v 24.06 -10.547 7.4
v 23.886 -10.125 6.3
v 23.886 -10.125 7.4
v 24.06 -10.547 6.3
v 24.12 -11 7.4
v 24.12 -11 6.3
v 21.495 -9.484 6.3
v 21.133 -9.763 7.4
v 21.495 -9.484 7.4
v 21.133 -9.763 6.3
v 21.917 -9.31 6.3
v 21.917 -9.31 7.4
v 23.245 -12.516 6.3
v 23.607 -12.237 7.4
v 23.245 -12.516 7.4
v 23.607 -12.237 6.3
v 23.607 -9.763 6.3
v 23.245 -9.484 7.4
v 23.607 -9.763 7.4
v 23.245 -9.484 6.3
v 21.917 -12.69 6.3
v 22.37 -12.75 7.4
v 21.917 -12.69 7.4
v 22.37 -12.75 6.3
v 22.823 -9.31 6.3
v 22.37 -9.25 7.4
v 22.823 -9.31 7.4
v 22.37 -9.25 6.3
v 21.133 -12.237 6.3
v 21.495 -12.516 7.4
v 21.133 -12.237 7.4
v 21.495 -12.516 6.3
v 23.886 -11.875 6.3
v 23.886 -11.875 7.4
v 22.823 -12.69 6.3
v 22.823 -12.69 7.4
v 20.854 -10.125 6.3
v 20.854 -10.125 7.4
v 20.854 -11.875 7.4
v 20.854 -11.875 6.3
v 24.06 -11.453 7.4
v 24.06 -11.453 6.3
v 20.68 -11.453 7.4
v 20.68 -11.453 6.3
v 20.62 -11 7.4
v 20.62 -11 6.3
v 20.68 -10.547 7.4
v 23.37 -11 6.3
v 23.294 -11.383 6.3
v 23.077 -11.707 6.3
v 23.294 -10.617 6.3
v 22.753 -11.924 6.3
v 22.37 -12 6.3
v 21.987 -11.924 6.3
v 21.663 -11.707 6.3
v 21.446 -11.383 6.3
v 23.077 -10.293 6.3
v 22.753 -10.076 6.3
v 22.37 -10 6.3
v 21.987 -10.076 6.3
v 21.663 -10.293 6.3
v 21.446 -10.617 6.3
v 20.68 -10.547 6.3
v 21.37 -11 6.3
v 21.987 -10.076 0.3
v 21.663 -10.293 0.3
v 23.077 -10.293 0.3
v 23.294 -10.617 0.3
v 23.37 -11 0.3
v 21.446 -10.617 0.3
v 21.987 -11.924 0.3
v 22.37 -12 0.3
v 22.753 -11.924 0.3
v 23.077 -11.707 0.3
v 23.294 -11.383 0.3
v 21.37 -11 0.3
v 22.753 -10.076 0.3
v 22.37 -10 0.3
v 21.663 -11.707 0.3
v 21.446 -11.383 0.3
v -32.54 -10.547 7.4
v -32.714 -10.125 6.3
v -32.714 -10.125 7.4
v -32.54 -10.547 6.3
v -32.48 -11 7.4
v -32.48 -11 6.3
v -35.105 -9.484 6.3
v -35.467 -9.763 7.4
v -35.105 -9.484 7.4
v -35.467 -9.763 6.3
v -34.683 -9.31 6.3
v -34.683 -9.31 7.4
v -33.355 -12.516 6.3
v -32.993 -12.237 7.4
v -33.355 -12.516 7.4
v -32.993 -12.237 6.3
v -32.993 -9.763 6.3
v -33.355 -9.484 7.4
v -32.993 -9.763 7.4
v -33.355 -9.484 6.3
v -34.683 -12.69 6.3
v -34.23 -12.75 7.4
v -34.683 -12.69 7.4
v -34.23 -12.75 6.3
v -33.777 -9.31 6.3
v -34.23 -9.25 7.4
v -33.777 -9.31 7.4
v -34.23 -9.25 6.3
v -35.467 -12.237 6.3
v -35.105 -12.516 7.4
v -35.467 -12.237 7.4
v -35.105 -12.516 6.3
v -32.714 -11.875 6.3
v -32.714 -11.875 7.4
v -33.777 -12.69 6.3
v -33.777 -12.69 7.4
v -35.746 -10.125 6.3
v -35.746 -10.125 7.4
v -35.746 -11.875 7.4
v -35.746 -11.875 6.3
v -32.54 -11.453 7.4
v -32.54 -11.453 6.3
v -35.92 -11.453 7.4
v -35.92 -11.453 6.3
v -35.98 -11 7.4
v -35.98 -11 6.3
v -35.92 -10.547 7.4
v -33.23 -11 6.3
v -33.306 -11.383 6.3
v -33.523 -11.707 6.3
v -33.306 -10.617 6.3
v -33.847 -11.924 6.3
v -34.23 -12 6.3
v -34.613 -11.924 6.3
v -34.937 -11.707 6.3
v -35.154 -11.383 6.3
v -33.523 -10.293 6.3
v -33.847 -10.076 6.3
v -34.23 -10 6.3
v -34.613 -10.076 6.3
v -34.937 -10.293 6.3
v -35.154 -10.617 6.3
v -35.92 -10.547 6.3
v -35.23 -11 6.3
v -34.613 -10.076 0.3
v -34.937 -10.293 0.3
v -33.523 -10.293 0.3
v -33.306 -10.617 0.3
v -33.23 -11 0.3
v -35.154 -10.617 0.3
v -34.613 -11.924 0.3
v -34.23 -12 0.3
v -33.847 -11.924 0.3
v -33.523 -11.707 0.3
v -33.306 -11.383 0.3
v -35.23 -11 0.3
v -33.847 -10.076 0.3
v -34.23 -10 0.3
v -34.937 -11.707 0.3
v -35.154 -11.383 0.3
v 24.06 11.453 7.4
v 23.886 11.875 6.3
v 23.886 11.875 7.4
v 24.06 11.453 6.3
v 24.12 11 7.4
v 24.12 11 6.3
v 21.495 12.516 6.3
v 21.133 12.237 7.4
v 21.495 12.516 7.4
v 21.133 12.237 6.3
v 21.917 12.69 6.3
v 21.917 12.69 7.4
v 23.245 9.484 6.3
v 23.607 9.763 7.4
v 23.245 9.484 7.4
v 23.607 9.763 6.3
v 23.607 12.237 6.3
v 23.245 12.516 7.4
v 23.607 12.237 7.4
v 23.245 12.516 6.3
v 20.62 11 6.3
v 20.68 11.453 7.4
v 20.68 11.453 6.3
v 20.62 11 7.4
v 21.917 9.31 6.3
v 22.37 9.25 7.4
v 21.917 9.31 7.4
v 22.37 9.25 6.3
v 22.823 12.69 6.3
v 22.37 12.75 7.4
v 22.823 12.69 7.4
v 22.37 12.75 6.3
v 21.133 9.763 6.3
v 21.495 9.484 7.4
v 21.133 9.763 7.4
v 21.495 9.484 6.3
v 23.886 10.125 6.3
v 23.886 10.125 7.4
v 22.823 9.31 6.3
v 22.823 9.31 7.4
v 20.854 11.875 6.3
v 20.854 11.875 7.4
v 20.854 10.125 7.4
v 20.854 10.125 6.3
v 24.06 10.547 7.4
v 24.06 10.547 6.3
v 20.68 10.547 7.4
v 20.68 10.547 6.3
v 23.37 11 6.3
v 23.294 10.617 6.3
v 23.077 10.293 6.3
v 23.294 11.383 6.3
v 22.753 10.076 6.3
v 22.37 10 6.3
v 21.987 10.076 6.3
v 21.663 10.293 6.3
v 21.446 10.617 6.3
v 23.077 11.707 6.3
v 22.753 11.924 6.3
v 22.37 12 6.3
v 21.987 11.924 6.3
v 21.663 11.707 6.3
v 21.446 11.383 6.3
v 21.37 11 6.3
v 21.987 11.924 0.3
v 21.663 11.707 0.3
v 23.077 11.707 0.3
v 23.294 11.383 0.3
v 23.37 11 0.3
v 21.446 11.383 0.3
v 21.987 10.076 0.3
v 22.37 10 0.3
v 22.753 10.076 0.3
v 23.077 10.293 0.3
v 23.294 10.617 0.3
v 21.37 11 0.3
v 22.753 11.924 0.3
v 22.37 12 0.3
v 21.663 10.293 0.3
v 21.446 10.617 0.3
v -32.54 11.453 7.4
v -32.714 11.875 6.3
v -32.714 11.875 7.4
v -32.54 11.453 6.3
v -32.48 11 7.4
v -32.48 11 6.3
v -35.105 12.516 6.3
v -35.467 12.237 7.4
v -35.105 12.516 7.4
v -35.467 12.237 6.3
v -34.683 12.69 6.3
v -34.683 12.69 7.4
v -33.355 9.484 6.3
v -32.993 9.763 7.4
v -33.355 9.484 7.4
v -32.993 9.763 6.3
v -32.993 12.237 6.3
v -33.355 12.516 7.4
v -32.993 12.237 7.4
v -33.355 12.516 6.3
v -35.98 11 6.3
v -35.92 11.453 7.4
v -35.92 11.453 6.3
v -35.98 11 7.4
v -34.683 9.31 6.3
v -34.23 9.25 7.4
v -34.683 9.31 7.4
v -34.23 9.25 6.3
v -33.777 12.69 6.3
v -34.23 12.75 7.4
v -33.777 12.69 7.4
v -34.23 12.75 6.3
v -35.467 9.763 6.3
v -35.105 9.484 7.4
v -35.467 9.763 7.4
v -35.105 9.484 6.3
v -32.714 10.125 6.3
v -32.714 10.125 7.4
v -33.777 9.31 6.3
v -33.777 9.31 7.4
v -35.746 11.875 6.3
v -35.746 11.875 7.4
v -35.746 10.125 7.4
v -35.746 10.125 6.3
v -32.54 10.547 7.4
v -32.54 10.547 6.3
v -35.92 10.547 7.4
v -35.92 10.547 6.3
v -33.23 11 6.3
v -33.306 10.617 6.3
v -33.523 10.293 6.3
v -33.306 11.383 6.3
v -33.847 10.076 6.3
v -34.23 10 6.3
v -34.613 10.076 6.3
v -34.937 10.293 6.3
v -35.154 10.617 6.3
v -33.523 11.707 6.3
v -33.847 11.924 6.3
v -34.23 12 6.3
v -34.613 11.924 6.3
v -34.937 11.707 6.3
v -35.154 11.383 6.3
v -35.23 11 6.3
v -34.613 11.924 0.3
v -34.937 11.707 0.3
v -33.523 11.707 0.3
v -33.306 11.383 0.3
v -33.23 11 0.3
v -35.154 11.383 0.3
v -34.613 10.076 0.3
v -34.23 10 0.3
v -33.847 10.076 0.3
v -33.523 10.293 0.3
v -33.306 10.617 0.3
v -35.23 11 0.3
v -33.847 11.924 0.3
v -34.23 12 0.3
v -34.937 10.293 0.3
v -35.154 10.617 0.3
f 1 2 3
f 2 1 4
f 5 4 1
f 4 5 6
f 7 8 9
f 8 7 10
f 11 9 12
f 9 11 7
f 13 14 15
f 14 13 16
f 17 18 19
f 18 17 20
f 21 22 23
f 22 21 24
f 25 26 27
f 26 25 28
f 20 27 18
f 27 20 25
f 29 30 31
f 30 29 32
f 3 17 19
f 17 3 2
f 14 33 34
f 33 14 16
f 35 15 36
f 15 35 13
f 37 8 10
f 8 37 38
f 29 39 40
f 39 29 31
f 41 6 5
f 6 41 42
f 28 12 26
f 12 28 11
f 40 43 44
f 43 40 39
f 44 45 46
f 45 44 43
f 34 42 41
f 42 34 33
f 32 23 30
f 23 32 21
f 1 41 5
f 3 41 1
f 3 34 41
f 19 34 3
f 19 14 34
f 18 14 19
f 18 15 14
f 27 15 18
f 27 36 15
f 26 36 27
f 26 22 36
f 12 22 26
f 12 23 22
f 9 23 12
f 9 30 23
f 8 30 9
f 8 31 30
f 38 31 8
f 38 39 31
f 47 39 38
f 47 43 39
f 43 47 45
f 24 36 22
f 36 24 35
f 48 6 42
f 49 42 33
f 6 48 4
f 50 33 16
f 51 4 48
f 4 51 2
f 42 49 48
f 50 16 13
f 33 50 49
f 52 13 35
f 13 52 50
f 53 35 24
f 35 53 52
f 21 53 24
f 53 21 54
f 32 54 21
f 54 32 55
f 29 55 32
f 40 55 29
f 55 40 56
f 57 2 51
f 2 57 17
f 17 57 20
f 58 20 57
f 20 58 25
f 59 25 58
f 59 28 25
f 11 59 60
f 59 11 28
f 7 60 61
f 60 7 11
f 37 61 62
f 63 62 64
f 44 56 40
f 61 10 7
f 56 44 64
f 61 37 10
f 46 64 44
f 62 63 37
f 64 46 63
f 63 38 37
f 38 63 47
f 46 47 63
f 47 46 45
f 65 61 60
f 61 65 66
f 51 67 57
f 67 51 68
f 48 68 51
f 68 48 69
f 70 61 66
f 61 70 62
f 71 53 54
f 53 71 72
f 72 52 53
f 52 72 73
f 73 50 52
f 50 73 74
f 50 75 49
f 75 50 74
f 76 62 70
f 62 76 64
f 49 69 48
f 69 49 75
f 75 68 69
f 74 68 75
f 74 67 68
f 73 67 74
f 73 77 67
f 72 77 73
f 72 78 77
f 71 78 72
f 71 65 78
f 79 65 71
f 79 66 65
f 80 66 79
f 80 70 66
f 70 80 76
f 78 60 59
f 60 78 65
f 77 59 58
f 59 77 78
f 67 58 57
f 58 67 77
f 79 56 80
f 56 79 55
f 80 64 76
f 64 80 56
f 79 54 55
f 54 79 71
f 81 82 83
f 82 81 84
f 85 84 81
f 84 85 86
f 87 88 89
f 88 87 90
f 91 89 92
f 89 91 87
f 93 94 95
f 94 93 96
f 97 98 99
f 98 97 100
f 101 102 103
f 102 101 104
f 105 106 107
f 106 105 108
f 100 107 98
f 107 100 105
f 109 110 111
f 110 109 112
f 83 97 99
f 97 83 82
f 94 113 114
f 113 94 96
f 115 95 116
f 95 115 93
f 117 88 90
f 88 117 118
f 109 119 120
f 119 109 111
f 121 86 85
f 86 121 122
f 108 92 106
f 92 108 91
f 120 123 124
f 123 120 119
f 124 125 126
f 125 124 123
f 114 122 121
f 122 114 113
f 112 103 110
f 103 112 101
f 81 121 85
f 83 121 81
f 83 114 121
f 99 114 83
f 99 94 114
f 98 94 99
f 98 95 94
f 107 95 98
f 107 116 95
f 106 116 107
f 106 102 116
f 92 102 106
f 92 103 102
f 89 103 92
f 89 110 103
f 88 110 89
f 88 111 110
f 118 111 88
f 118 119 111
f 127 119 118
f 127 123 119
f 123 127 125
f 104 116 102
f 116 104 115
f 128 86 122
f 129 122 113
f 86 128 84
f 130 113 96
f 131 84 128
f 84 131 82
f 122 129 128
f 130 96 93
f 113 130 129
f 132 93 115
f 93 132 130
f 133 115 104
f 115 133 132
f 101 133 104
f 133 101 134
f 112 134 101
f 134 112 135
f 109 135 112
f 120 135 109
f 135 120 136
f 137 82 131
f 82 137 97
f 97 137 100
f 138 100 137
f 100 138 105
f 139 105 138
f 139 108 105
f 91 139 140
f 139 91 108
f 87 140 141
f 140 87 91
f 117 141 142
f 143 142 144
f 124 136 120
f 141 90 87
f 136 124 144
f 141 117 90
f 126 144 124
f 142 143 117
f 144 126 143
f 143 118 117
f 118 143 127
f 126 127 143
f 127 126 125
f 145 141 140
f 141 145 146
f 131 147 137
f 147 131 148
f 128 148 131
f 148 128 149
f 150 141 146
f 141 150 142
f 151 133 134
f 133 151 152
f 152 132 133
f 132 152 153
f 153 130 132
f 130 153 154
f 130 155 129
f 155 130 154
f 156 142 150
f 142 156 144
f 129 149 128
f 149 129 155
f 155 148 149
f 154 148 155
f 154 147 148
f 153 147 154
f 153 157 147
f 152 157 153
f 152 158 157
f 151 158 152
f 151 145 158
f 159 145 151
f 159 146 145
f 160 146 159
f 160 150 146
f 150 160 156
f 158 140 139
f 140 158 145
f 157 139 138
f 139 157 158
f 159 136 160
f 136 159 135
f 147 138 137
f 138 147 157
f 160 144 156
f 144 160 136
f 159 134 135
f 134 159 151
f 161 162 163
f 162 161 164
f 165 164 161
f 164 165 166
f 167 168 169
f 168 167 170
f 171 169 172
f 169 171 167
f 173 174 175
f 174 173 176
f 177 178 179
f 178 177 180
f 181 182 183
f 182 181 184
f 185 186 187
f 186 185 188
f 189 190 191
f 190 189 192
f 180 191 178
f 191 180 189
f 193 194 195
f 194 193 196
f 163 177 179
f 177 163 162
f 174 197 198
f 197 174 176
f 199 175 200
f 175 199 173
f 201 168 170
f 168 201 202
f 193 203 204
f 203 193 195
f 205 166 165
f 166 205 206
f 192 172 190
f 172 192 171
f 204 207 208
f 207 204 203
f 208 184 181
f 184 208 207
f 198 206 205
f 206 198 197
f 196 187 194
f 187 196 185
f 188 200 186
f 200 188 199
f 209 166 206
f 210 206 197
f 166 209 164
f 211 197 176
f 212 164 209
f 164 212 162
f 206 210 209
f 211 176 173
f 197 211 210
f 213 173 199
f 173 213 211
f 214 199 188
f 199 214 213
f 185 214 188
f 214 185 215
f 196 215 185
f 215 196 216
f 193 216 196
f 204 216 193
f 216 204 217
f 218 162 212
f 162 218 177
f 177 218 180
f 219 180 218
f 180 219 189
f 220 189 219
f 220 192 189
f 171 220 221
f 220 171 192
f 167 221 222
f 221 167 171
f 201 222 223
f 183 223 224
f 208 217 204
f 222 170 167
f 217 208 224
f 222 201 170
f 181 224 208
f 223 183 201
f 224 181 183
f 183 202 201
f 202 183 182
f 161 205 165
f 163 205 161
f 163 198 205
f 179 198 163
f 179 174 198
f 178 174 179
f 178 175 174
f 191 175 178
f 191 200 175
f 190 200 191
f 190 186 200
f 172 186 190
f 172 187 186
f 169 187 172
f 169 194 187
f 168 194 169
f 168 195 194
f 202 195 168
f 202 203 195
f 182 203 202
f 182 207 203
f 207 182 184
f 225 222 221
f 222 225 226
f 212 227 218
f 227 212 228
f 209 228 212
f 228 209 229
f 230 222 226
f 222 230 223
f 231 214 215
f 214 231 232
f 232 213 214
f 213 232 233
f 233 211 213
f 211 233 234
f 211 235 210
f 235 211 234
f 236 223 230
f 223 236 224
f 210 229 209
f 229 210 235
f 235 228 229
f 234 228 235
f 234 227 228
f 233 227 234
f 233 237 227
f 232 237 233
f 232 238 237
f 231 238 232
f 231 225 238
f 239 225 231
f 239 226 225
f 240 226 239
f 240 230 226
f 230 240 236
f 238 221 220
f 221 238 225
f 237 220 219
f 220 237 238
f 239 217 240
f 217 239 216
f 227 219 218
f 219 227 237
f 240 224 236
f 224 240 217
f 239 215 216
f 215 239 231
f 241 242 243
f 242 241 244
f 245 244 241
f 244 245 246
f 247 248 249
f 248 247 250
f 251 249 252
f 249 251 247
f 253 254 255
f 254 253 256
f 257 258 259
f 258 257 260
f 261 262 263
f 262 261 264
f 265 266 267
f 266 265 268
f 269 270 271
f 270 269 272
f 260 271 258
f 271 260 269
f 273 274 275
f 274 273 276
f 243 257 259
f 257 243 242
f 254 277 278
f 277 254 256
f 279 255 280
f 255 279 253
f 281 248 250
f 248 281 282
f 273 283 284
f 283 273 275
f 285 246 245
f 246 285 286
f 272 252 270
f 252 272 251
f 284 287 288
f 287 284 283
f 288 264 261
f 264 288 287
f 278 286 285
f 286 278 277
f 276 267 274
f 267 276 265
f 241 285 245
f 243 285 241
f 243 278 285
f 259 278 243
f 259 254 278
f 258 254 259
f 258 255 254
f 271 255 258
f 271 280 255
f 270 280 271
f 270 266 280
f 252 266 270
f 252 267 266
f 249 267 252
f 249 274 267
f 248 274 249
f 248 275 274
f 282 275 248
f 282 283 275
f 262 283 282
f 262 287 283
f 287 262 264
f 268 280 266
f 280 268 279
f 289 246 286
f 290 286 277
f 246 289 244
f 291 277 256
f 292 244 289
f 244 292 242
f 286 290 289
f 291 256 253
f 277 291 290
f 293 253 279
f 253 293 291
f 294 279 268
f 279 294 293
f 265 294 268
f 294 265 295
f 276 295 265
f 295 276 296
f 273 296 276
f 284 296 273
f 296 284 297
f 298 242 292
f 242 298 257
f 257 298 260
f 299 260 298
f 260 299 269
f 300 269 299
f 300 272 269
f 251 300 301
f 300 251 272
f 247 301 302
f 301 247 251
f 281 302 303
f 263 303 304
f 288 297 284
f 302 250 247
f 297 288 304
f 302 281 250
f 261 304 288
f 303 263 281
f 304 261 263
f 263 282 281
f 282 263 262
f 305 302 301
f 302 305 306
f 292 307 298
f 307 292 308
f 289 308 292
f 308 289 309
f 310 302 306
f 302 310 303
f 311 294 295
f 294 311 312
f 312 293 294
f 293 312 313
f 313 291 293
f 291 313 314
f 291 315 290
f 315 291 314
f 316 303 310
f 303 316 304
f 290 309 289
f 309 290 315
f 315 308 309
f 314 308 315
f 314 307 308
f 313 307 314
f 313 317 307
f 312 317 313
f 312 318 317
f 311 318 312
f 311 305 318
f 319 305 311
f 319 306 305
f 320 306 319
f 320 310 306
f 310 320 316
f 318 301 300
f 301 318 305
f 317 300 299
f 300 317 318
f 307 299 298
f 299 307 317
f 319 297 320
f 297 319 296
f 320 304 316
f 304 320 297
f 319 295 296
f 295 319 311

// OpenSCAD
// file: ../../usb-c-port/usb-c-port.scad
//-----------------------------------------------------------------------
// USB-C port through a wall, flush: the socket's metal shell sits in a
// close-fitting pocket in the wall, walled in on all four sides, its face
// level with the outside. The cable seats the way it does on a laptop.
//
// A board's socket only overhangs the board edge by a mm or so, less than
// the wall. So the board's end tucks into a shallow relief in the wall's
// inner face, the width of the board, leaving the wall round the socket
// thin enough for the face to reach the outside. When that would leave less
// than usbcMinWall (a socket that barely overhangs), the face sits back from
// the outside instead: usbcRecess() says how far.
//
// Modules, all in the same frame:
//   usbcGhost()     the socket and the board's end, for previews
//   usbcWallCut()   subtract from the wall: socket pocket and board relief
//
// Frame: origin on the floor top at the wall's inner face, under the socket's
// axis. +X into the box, Z up. The wall is X = -wall .. 0. The board is
// component side up, socket on top (top-mount, as on the FireBeetle, C3 Super
// Mini and S3 DevKitC). Units: mm.
//
// usbcBoardEdgeX() gives where the board's edge lands (negative: inside the
// wall), so a holder can put its posts or pocket to match.
//-----------------------------------------------------------------------

//-- The socket: USB-C receptacle shell (USB-IF 8.34 x 2.56 plug, receptacle shell ~8.94 x 3.26)
usbcShellW     = 8.94;
usbcShellH     = 3.26;    // CAL per board: measured 3.2 on the FireBeetle
usbcShellR     = 1.2;     // CAL: end radius. Full round would be 1.63; most shells are squarer
usbcShellDepth = 7.35;    // face to back

//-- The pocket
usbcClearance  = 0.15;    // CAL: per side, shell to pocket. Set by the fit piece
usbcMinWall    = 1.0;     // thinnest wall left round the socket
usbcReliefGap  = 0.3;     // board relief over the board, each side and above/below
usbcChamfer    = 0.3;     // lead-in on the outside edge

//-- How far the socket face sits back from the outside: 0 (flush) unless the socket
//-- overhangs the board edge by less than usbcMinWall
function usbcRecess(overhang, minWall = usbcMinWall) = max(0, minWall - overhang);
//-- X of the board's socket edge in this frame
function usbcBoardEdgeX(wall, overhang, recess) =
  -wall + (is_undef(recess) ? usbcRecess(overhang) : recess) + overhang;
//-- Z of the board's underside above the floor top
function usbcBoardZ(axisZ, pcb, shellH = usbcShellH) = axisZ - shellH/2 - pcb;

module usbcShell2D(grow = 0, w = usbcShellW, h = usbcShellH, r = usbcShellR)
{
  offset(r = r + grow, $fn = 24) square([w - 2*r, h - 2*r], center = true);
}

//-- axisZ: socket axis above the floor. boardW/pcb: the board, for the ghost and relief.
//-- shift: socket centre across the board's width from the board's centre line (+Y)
module usbcGhost(axisZ, wall, overhang, boardW, pcb = 1.6, recess, shift = 0, shellH = usbcShellH, shellW = usbcShellW)
{
  ex = usbcBoardEdgeX(wall, overhang, recess);
  %color("Silver") translate([ex - overhang, 0, axisZ]) rotate([0, 90, 0]) rotate([0, 0, 90])
    linear_extrude(usbcShellDepth) usbcShell2D(w = shellW, h = shellH);
  %color("DarkSlateGray") translate([ex, -boardW/2 - shift, usbcBoardZ(axisZ, pcb, shellH)]) cube([12, boardW, pcb]);
}

module usbcWallCut(axisZ, wall, overhang, boardW, pcb = 1.6, recess, shift = 0,
                   clearance = usbcClearance, shellH = usbcShellH, shellW = usbcShellW, aboveBoard)
{
  rc = is_undef(recess) ? usbcRecess(overhang) : recess;
  ex = usbcBoardEdgeX(wall, overhang, rc);
  bz = usbcBoardZ(axisZ, pcb, shellH);
  //-- what stands on the board near its edge: the socket, unless told taller
  up = is_undef(aboveBoard) ? shellH : aboveBoard;
  assert(ex - overhang + wall >= -0.01, "socket face would stand proud of the wall");
  assert(rc > 0 || overhang >= usbcMinWall - 0.01, "wall round the socket under usbcMinWall");
  //-- socket pocket, through the wall
  translate([-wall - 1, 0, axisZ]) rotate([0, 90, 0]) rotate([0, 0, 90])
    linear_extrude(wall + 2) usbcShell2D(clearance, w = shellW, h = shellH);
  //-- lead-in chamfer on the outside
  translate([-wall, 0, axisZ]) rotate([0, 90, 0]) rotate([0, 0, 90])
    hull()
    {
      translate([0, 0, -0.01]) linear_extrude(0.01) usbcShell2D(clearance + usbcChamfer, w = shellW, h = shellH);
      translate([0, 0, usbcChamfer]) linear_extrude(0.01) usbcShell2D(clearance, w = shellW, h = shellH);
    }
  //-- board relief in the inner face, when the board's edge lands inside the wall
  if (ex < 0)
    translate([ex - usbcReliefGap, -boardW/2 - shift - usbcReliefGap, bz - usbcReliefGap])
      cube([-ex + usbcReliefGap + 1, boardW + 2*usbcReliefGap, pcb + up + 2*usbcReliefGap]);
}
// file: ../../screw-post/screw-post.scad
//-----------------------------------------------------------------------
// Screw post: a round post off the floor that a board screws down onto
//
// Two ways to fix:
//   "nut"  clearance hole through the post and floor; the nut sits in a hex
//          trap in the floor's underside, so the screw goes in from the top
//   "tap"  a pilot hole the screw cuts its own thread in (one or two fittings
//          in PLA/PETG); blind, the floor stays whole underneath
// and "head" for a screw up from below (head in a counterbore, nut on top).
//
// Modules, all in the same frame:
//   screwPostGhost()     the screw (and nut), for previews
//   screwPost()          the post: add to the floor
//   screwPostFloorCut()  subtract from the floor: nut trap / counterbore and hole
//
// Frame: origin on the floor top, on the post's axis. Z up; the floor is
// Z = -floorThick .. 0. Units: mm.
//
// Sizes: "M2", "M2.5", "M3". screwPostScrew(size, ...) says which screw length
// reaches, so a project can assert it has that screw in the kit.
//-----------------------------------------------------------------------

//-- [name, screw Ø, nut across flats, nut thick, head Ø, head height, tap hole, post Ø]
//-- Nuts ISO 4032; heads ISO 7380 button. Tap holes: the usual ~0.8 x Ø for plastic
screwSizes = [
  ["M2",   2.0, 4.0, 1.6, 3.5, 1.1, 1.6, 5.0],
  ["M2.5", 2.5, 5.0, 2.0, 4.4, 1.4, 2.1, 6.0],    // head 4.4: measured on the kit's M2.5 (controller base)
  ["M3",   3.0, 5.5, 2.4, 5.7, 1.65, 2.5, 7.0],
];

screwHoleClear = 0.4;     // added to the screw Ø for a clearance hole
screwNutClear  = 0.3;     // CAL: across flats, nut trap over the nut. Set by the fit piece
screwTapClear  = 0.0;     // CAL: added to the tap hole. Set by the fit piece
screwHeadClear = 0.6;     // counterbore over the head Ø

function screwSize(size) = let (i = search([size], screwSizes)[0])
  assert(i != [] && i != undef, str("unknown screw size ", size)) screwSizes[i];
function screwDia(size)    = screwSize(size)[1];
function screwNutAF(size)  = screwSize(size)[2];
function screwNutH(size)   = screwSize(size)[3];
function screwHeadDia(size)= screwSize(size)[4];
function screwHeadH(size)  = screwSize(size)[5];
function screwPostDia(size)= screwSize(size)[7];

//-- Shortest screw that fills the nut, from the top of the clamped part (h + clamp
//-- above the floor) down to the nut trap's underside. Round up to a length you have.
function screwPostScrew(size, h, floorThick, clamp = 1.6) = h + clamp + floorThick;

module screwPostGhost(size, h, floorThick, clamp = 1.6, length, how = "nut")
{
  d = screwDia(size);
  L = is_undef(length) ? screwPostScrew(size, h, floorThick, clamp) : length;
  top = h + clamp;
  if (how == "head")
  {
    %color("Silver") translate([0, 0, -floorThick]) cylinder(d = screwHeadDia(size), h = screwHeadH(size), $fn = 24);
    %color("Silver") translate([0, 0, -floorThick + screwHeadH(size)]) cylinder(d = d, h = L, $fn = 16);
  }
  else
  {
    %color("Silver") translate([0, 0, top]) cylinder(d = screwHeadDia(size), h = screwHeadH(size), $fn = 24);
    %color("Silver") translate([0, 0, top - L]) cylinder(d = d, h = L, $fn = 16);
    if (how == "nut")
      %color("DimGray") translate([0, 0, -floorThick]) rotate([0, 0, 30]) cylinder(d = screwNutAF(size)/cos(30), h = screwNutH(size), $fn = 6);
  }
}

//-- how: "nut" | "head" (through hole) or "tap" (blind pilot hole). postDia defaults by size
module screwPost(size, h, how = "nut", postDia, tapClear = screwTapClear)
{
  pd = is_undef(postDia) ? screwPostDia(size) : postDia;
  hole = how == "tap" ? screwSize(size)[6] + tapClear : screwDia(size) + screwHoleClear;
  difference()
  {
    translate([0, 0, -0.01]) cylinder(d = pd, h = h + 0.01, $fn = 40);
    translate([0, 0, how == "tap" ? 0.6 : -1]) cylinder(d = hole, h = h + 2, $fn = 24);
    //-- lead-in so the screw starts square
    translate([0, 0, h - 0.4]) cylinder(d1 = hole, d2 = hole + 0.8, h = 0.41, $fn = 24);
  }
}

//-- "nut": hex trap from the underside, opening a little over the nut so it sits flush.
//-- "head": counterbore for the head. "tap": nothing.
module screwPostFloorCut(size, floorThick, how = "nut", nutClear = screwNutClear)
{
  d = screwDia(size) + screwHoleClear;
  if (how == "nut")
  {
    af = screwNutAF(size) + nutClear;
    translate([0, 0, -floorThick - 1]) rotate([0, 0, 30]) cylinder(d = af/cos(30), h = screwNutH(size) + 0.1 + 1, $fn = 6);
    translate([0, 0, -floorThick - 1]) cylinder(d = d + 0.4, h = floorThick + 2, $fn = 24);
  }
  if (how == "head")
  {
    translate([0, 0, -floorThick - 1]) cylinder(d = screwHeadDia(size) + screwHeadClear, h = screwHeadH(size) + 0.2 + 1, $fn = 32);
    translate([0, 0, -floorThick - 1]) cylinder(d = d + 0.4, h = floorThick + 2, $fn = 24);
  }
  assert(how == "tap" || floorThick >= (how == "nut" ? screwNutH(size) : screwHeadH(size)) + 0.1 + 0.3,
         str("floor too thin for the ", size, " ", how));
}
// main file
// The screws on the carrier as solids, for the catalogue.
// which = "board":   the four M2 x 6 button heads holding the board to its posts (move with it)
// which = "carrier": the six M2.5 x 6 holding the carrier down, heads on the plate
use <../firebeetle-esp32e.scad>
use <../../carrier/carrier.scad>
use <../../screw-post/screw-post.scad>

variant = "ESP32-E";
wall    = 2.4;
postH   = 4.7;
length  = 6;
which   = "board";

if (which == "board")
{
  s   = "M2";
  top = fbCarrierTop(variant, postH);
  translate(fbCarrierAt(variant, wall))
    for (h = fbHoles(variant, wall))
      translate([h[0], h[1], 0])
      {
        translate([0, 0, top]) cylinder(d = screwHeadDia(s), h = screwHeadH(s), $fn = 24);
        translate([0, 0, top - length]) cylinder(d = screwDia(s), h = length + 0.01, $fn = 16);
      }
}
if (which == "carrier")
{
  n = fbCarrierSize(variant, wall);
  carrierScrews(n[0], n[1]);
}
